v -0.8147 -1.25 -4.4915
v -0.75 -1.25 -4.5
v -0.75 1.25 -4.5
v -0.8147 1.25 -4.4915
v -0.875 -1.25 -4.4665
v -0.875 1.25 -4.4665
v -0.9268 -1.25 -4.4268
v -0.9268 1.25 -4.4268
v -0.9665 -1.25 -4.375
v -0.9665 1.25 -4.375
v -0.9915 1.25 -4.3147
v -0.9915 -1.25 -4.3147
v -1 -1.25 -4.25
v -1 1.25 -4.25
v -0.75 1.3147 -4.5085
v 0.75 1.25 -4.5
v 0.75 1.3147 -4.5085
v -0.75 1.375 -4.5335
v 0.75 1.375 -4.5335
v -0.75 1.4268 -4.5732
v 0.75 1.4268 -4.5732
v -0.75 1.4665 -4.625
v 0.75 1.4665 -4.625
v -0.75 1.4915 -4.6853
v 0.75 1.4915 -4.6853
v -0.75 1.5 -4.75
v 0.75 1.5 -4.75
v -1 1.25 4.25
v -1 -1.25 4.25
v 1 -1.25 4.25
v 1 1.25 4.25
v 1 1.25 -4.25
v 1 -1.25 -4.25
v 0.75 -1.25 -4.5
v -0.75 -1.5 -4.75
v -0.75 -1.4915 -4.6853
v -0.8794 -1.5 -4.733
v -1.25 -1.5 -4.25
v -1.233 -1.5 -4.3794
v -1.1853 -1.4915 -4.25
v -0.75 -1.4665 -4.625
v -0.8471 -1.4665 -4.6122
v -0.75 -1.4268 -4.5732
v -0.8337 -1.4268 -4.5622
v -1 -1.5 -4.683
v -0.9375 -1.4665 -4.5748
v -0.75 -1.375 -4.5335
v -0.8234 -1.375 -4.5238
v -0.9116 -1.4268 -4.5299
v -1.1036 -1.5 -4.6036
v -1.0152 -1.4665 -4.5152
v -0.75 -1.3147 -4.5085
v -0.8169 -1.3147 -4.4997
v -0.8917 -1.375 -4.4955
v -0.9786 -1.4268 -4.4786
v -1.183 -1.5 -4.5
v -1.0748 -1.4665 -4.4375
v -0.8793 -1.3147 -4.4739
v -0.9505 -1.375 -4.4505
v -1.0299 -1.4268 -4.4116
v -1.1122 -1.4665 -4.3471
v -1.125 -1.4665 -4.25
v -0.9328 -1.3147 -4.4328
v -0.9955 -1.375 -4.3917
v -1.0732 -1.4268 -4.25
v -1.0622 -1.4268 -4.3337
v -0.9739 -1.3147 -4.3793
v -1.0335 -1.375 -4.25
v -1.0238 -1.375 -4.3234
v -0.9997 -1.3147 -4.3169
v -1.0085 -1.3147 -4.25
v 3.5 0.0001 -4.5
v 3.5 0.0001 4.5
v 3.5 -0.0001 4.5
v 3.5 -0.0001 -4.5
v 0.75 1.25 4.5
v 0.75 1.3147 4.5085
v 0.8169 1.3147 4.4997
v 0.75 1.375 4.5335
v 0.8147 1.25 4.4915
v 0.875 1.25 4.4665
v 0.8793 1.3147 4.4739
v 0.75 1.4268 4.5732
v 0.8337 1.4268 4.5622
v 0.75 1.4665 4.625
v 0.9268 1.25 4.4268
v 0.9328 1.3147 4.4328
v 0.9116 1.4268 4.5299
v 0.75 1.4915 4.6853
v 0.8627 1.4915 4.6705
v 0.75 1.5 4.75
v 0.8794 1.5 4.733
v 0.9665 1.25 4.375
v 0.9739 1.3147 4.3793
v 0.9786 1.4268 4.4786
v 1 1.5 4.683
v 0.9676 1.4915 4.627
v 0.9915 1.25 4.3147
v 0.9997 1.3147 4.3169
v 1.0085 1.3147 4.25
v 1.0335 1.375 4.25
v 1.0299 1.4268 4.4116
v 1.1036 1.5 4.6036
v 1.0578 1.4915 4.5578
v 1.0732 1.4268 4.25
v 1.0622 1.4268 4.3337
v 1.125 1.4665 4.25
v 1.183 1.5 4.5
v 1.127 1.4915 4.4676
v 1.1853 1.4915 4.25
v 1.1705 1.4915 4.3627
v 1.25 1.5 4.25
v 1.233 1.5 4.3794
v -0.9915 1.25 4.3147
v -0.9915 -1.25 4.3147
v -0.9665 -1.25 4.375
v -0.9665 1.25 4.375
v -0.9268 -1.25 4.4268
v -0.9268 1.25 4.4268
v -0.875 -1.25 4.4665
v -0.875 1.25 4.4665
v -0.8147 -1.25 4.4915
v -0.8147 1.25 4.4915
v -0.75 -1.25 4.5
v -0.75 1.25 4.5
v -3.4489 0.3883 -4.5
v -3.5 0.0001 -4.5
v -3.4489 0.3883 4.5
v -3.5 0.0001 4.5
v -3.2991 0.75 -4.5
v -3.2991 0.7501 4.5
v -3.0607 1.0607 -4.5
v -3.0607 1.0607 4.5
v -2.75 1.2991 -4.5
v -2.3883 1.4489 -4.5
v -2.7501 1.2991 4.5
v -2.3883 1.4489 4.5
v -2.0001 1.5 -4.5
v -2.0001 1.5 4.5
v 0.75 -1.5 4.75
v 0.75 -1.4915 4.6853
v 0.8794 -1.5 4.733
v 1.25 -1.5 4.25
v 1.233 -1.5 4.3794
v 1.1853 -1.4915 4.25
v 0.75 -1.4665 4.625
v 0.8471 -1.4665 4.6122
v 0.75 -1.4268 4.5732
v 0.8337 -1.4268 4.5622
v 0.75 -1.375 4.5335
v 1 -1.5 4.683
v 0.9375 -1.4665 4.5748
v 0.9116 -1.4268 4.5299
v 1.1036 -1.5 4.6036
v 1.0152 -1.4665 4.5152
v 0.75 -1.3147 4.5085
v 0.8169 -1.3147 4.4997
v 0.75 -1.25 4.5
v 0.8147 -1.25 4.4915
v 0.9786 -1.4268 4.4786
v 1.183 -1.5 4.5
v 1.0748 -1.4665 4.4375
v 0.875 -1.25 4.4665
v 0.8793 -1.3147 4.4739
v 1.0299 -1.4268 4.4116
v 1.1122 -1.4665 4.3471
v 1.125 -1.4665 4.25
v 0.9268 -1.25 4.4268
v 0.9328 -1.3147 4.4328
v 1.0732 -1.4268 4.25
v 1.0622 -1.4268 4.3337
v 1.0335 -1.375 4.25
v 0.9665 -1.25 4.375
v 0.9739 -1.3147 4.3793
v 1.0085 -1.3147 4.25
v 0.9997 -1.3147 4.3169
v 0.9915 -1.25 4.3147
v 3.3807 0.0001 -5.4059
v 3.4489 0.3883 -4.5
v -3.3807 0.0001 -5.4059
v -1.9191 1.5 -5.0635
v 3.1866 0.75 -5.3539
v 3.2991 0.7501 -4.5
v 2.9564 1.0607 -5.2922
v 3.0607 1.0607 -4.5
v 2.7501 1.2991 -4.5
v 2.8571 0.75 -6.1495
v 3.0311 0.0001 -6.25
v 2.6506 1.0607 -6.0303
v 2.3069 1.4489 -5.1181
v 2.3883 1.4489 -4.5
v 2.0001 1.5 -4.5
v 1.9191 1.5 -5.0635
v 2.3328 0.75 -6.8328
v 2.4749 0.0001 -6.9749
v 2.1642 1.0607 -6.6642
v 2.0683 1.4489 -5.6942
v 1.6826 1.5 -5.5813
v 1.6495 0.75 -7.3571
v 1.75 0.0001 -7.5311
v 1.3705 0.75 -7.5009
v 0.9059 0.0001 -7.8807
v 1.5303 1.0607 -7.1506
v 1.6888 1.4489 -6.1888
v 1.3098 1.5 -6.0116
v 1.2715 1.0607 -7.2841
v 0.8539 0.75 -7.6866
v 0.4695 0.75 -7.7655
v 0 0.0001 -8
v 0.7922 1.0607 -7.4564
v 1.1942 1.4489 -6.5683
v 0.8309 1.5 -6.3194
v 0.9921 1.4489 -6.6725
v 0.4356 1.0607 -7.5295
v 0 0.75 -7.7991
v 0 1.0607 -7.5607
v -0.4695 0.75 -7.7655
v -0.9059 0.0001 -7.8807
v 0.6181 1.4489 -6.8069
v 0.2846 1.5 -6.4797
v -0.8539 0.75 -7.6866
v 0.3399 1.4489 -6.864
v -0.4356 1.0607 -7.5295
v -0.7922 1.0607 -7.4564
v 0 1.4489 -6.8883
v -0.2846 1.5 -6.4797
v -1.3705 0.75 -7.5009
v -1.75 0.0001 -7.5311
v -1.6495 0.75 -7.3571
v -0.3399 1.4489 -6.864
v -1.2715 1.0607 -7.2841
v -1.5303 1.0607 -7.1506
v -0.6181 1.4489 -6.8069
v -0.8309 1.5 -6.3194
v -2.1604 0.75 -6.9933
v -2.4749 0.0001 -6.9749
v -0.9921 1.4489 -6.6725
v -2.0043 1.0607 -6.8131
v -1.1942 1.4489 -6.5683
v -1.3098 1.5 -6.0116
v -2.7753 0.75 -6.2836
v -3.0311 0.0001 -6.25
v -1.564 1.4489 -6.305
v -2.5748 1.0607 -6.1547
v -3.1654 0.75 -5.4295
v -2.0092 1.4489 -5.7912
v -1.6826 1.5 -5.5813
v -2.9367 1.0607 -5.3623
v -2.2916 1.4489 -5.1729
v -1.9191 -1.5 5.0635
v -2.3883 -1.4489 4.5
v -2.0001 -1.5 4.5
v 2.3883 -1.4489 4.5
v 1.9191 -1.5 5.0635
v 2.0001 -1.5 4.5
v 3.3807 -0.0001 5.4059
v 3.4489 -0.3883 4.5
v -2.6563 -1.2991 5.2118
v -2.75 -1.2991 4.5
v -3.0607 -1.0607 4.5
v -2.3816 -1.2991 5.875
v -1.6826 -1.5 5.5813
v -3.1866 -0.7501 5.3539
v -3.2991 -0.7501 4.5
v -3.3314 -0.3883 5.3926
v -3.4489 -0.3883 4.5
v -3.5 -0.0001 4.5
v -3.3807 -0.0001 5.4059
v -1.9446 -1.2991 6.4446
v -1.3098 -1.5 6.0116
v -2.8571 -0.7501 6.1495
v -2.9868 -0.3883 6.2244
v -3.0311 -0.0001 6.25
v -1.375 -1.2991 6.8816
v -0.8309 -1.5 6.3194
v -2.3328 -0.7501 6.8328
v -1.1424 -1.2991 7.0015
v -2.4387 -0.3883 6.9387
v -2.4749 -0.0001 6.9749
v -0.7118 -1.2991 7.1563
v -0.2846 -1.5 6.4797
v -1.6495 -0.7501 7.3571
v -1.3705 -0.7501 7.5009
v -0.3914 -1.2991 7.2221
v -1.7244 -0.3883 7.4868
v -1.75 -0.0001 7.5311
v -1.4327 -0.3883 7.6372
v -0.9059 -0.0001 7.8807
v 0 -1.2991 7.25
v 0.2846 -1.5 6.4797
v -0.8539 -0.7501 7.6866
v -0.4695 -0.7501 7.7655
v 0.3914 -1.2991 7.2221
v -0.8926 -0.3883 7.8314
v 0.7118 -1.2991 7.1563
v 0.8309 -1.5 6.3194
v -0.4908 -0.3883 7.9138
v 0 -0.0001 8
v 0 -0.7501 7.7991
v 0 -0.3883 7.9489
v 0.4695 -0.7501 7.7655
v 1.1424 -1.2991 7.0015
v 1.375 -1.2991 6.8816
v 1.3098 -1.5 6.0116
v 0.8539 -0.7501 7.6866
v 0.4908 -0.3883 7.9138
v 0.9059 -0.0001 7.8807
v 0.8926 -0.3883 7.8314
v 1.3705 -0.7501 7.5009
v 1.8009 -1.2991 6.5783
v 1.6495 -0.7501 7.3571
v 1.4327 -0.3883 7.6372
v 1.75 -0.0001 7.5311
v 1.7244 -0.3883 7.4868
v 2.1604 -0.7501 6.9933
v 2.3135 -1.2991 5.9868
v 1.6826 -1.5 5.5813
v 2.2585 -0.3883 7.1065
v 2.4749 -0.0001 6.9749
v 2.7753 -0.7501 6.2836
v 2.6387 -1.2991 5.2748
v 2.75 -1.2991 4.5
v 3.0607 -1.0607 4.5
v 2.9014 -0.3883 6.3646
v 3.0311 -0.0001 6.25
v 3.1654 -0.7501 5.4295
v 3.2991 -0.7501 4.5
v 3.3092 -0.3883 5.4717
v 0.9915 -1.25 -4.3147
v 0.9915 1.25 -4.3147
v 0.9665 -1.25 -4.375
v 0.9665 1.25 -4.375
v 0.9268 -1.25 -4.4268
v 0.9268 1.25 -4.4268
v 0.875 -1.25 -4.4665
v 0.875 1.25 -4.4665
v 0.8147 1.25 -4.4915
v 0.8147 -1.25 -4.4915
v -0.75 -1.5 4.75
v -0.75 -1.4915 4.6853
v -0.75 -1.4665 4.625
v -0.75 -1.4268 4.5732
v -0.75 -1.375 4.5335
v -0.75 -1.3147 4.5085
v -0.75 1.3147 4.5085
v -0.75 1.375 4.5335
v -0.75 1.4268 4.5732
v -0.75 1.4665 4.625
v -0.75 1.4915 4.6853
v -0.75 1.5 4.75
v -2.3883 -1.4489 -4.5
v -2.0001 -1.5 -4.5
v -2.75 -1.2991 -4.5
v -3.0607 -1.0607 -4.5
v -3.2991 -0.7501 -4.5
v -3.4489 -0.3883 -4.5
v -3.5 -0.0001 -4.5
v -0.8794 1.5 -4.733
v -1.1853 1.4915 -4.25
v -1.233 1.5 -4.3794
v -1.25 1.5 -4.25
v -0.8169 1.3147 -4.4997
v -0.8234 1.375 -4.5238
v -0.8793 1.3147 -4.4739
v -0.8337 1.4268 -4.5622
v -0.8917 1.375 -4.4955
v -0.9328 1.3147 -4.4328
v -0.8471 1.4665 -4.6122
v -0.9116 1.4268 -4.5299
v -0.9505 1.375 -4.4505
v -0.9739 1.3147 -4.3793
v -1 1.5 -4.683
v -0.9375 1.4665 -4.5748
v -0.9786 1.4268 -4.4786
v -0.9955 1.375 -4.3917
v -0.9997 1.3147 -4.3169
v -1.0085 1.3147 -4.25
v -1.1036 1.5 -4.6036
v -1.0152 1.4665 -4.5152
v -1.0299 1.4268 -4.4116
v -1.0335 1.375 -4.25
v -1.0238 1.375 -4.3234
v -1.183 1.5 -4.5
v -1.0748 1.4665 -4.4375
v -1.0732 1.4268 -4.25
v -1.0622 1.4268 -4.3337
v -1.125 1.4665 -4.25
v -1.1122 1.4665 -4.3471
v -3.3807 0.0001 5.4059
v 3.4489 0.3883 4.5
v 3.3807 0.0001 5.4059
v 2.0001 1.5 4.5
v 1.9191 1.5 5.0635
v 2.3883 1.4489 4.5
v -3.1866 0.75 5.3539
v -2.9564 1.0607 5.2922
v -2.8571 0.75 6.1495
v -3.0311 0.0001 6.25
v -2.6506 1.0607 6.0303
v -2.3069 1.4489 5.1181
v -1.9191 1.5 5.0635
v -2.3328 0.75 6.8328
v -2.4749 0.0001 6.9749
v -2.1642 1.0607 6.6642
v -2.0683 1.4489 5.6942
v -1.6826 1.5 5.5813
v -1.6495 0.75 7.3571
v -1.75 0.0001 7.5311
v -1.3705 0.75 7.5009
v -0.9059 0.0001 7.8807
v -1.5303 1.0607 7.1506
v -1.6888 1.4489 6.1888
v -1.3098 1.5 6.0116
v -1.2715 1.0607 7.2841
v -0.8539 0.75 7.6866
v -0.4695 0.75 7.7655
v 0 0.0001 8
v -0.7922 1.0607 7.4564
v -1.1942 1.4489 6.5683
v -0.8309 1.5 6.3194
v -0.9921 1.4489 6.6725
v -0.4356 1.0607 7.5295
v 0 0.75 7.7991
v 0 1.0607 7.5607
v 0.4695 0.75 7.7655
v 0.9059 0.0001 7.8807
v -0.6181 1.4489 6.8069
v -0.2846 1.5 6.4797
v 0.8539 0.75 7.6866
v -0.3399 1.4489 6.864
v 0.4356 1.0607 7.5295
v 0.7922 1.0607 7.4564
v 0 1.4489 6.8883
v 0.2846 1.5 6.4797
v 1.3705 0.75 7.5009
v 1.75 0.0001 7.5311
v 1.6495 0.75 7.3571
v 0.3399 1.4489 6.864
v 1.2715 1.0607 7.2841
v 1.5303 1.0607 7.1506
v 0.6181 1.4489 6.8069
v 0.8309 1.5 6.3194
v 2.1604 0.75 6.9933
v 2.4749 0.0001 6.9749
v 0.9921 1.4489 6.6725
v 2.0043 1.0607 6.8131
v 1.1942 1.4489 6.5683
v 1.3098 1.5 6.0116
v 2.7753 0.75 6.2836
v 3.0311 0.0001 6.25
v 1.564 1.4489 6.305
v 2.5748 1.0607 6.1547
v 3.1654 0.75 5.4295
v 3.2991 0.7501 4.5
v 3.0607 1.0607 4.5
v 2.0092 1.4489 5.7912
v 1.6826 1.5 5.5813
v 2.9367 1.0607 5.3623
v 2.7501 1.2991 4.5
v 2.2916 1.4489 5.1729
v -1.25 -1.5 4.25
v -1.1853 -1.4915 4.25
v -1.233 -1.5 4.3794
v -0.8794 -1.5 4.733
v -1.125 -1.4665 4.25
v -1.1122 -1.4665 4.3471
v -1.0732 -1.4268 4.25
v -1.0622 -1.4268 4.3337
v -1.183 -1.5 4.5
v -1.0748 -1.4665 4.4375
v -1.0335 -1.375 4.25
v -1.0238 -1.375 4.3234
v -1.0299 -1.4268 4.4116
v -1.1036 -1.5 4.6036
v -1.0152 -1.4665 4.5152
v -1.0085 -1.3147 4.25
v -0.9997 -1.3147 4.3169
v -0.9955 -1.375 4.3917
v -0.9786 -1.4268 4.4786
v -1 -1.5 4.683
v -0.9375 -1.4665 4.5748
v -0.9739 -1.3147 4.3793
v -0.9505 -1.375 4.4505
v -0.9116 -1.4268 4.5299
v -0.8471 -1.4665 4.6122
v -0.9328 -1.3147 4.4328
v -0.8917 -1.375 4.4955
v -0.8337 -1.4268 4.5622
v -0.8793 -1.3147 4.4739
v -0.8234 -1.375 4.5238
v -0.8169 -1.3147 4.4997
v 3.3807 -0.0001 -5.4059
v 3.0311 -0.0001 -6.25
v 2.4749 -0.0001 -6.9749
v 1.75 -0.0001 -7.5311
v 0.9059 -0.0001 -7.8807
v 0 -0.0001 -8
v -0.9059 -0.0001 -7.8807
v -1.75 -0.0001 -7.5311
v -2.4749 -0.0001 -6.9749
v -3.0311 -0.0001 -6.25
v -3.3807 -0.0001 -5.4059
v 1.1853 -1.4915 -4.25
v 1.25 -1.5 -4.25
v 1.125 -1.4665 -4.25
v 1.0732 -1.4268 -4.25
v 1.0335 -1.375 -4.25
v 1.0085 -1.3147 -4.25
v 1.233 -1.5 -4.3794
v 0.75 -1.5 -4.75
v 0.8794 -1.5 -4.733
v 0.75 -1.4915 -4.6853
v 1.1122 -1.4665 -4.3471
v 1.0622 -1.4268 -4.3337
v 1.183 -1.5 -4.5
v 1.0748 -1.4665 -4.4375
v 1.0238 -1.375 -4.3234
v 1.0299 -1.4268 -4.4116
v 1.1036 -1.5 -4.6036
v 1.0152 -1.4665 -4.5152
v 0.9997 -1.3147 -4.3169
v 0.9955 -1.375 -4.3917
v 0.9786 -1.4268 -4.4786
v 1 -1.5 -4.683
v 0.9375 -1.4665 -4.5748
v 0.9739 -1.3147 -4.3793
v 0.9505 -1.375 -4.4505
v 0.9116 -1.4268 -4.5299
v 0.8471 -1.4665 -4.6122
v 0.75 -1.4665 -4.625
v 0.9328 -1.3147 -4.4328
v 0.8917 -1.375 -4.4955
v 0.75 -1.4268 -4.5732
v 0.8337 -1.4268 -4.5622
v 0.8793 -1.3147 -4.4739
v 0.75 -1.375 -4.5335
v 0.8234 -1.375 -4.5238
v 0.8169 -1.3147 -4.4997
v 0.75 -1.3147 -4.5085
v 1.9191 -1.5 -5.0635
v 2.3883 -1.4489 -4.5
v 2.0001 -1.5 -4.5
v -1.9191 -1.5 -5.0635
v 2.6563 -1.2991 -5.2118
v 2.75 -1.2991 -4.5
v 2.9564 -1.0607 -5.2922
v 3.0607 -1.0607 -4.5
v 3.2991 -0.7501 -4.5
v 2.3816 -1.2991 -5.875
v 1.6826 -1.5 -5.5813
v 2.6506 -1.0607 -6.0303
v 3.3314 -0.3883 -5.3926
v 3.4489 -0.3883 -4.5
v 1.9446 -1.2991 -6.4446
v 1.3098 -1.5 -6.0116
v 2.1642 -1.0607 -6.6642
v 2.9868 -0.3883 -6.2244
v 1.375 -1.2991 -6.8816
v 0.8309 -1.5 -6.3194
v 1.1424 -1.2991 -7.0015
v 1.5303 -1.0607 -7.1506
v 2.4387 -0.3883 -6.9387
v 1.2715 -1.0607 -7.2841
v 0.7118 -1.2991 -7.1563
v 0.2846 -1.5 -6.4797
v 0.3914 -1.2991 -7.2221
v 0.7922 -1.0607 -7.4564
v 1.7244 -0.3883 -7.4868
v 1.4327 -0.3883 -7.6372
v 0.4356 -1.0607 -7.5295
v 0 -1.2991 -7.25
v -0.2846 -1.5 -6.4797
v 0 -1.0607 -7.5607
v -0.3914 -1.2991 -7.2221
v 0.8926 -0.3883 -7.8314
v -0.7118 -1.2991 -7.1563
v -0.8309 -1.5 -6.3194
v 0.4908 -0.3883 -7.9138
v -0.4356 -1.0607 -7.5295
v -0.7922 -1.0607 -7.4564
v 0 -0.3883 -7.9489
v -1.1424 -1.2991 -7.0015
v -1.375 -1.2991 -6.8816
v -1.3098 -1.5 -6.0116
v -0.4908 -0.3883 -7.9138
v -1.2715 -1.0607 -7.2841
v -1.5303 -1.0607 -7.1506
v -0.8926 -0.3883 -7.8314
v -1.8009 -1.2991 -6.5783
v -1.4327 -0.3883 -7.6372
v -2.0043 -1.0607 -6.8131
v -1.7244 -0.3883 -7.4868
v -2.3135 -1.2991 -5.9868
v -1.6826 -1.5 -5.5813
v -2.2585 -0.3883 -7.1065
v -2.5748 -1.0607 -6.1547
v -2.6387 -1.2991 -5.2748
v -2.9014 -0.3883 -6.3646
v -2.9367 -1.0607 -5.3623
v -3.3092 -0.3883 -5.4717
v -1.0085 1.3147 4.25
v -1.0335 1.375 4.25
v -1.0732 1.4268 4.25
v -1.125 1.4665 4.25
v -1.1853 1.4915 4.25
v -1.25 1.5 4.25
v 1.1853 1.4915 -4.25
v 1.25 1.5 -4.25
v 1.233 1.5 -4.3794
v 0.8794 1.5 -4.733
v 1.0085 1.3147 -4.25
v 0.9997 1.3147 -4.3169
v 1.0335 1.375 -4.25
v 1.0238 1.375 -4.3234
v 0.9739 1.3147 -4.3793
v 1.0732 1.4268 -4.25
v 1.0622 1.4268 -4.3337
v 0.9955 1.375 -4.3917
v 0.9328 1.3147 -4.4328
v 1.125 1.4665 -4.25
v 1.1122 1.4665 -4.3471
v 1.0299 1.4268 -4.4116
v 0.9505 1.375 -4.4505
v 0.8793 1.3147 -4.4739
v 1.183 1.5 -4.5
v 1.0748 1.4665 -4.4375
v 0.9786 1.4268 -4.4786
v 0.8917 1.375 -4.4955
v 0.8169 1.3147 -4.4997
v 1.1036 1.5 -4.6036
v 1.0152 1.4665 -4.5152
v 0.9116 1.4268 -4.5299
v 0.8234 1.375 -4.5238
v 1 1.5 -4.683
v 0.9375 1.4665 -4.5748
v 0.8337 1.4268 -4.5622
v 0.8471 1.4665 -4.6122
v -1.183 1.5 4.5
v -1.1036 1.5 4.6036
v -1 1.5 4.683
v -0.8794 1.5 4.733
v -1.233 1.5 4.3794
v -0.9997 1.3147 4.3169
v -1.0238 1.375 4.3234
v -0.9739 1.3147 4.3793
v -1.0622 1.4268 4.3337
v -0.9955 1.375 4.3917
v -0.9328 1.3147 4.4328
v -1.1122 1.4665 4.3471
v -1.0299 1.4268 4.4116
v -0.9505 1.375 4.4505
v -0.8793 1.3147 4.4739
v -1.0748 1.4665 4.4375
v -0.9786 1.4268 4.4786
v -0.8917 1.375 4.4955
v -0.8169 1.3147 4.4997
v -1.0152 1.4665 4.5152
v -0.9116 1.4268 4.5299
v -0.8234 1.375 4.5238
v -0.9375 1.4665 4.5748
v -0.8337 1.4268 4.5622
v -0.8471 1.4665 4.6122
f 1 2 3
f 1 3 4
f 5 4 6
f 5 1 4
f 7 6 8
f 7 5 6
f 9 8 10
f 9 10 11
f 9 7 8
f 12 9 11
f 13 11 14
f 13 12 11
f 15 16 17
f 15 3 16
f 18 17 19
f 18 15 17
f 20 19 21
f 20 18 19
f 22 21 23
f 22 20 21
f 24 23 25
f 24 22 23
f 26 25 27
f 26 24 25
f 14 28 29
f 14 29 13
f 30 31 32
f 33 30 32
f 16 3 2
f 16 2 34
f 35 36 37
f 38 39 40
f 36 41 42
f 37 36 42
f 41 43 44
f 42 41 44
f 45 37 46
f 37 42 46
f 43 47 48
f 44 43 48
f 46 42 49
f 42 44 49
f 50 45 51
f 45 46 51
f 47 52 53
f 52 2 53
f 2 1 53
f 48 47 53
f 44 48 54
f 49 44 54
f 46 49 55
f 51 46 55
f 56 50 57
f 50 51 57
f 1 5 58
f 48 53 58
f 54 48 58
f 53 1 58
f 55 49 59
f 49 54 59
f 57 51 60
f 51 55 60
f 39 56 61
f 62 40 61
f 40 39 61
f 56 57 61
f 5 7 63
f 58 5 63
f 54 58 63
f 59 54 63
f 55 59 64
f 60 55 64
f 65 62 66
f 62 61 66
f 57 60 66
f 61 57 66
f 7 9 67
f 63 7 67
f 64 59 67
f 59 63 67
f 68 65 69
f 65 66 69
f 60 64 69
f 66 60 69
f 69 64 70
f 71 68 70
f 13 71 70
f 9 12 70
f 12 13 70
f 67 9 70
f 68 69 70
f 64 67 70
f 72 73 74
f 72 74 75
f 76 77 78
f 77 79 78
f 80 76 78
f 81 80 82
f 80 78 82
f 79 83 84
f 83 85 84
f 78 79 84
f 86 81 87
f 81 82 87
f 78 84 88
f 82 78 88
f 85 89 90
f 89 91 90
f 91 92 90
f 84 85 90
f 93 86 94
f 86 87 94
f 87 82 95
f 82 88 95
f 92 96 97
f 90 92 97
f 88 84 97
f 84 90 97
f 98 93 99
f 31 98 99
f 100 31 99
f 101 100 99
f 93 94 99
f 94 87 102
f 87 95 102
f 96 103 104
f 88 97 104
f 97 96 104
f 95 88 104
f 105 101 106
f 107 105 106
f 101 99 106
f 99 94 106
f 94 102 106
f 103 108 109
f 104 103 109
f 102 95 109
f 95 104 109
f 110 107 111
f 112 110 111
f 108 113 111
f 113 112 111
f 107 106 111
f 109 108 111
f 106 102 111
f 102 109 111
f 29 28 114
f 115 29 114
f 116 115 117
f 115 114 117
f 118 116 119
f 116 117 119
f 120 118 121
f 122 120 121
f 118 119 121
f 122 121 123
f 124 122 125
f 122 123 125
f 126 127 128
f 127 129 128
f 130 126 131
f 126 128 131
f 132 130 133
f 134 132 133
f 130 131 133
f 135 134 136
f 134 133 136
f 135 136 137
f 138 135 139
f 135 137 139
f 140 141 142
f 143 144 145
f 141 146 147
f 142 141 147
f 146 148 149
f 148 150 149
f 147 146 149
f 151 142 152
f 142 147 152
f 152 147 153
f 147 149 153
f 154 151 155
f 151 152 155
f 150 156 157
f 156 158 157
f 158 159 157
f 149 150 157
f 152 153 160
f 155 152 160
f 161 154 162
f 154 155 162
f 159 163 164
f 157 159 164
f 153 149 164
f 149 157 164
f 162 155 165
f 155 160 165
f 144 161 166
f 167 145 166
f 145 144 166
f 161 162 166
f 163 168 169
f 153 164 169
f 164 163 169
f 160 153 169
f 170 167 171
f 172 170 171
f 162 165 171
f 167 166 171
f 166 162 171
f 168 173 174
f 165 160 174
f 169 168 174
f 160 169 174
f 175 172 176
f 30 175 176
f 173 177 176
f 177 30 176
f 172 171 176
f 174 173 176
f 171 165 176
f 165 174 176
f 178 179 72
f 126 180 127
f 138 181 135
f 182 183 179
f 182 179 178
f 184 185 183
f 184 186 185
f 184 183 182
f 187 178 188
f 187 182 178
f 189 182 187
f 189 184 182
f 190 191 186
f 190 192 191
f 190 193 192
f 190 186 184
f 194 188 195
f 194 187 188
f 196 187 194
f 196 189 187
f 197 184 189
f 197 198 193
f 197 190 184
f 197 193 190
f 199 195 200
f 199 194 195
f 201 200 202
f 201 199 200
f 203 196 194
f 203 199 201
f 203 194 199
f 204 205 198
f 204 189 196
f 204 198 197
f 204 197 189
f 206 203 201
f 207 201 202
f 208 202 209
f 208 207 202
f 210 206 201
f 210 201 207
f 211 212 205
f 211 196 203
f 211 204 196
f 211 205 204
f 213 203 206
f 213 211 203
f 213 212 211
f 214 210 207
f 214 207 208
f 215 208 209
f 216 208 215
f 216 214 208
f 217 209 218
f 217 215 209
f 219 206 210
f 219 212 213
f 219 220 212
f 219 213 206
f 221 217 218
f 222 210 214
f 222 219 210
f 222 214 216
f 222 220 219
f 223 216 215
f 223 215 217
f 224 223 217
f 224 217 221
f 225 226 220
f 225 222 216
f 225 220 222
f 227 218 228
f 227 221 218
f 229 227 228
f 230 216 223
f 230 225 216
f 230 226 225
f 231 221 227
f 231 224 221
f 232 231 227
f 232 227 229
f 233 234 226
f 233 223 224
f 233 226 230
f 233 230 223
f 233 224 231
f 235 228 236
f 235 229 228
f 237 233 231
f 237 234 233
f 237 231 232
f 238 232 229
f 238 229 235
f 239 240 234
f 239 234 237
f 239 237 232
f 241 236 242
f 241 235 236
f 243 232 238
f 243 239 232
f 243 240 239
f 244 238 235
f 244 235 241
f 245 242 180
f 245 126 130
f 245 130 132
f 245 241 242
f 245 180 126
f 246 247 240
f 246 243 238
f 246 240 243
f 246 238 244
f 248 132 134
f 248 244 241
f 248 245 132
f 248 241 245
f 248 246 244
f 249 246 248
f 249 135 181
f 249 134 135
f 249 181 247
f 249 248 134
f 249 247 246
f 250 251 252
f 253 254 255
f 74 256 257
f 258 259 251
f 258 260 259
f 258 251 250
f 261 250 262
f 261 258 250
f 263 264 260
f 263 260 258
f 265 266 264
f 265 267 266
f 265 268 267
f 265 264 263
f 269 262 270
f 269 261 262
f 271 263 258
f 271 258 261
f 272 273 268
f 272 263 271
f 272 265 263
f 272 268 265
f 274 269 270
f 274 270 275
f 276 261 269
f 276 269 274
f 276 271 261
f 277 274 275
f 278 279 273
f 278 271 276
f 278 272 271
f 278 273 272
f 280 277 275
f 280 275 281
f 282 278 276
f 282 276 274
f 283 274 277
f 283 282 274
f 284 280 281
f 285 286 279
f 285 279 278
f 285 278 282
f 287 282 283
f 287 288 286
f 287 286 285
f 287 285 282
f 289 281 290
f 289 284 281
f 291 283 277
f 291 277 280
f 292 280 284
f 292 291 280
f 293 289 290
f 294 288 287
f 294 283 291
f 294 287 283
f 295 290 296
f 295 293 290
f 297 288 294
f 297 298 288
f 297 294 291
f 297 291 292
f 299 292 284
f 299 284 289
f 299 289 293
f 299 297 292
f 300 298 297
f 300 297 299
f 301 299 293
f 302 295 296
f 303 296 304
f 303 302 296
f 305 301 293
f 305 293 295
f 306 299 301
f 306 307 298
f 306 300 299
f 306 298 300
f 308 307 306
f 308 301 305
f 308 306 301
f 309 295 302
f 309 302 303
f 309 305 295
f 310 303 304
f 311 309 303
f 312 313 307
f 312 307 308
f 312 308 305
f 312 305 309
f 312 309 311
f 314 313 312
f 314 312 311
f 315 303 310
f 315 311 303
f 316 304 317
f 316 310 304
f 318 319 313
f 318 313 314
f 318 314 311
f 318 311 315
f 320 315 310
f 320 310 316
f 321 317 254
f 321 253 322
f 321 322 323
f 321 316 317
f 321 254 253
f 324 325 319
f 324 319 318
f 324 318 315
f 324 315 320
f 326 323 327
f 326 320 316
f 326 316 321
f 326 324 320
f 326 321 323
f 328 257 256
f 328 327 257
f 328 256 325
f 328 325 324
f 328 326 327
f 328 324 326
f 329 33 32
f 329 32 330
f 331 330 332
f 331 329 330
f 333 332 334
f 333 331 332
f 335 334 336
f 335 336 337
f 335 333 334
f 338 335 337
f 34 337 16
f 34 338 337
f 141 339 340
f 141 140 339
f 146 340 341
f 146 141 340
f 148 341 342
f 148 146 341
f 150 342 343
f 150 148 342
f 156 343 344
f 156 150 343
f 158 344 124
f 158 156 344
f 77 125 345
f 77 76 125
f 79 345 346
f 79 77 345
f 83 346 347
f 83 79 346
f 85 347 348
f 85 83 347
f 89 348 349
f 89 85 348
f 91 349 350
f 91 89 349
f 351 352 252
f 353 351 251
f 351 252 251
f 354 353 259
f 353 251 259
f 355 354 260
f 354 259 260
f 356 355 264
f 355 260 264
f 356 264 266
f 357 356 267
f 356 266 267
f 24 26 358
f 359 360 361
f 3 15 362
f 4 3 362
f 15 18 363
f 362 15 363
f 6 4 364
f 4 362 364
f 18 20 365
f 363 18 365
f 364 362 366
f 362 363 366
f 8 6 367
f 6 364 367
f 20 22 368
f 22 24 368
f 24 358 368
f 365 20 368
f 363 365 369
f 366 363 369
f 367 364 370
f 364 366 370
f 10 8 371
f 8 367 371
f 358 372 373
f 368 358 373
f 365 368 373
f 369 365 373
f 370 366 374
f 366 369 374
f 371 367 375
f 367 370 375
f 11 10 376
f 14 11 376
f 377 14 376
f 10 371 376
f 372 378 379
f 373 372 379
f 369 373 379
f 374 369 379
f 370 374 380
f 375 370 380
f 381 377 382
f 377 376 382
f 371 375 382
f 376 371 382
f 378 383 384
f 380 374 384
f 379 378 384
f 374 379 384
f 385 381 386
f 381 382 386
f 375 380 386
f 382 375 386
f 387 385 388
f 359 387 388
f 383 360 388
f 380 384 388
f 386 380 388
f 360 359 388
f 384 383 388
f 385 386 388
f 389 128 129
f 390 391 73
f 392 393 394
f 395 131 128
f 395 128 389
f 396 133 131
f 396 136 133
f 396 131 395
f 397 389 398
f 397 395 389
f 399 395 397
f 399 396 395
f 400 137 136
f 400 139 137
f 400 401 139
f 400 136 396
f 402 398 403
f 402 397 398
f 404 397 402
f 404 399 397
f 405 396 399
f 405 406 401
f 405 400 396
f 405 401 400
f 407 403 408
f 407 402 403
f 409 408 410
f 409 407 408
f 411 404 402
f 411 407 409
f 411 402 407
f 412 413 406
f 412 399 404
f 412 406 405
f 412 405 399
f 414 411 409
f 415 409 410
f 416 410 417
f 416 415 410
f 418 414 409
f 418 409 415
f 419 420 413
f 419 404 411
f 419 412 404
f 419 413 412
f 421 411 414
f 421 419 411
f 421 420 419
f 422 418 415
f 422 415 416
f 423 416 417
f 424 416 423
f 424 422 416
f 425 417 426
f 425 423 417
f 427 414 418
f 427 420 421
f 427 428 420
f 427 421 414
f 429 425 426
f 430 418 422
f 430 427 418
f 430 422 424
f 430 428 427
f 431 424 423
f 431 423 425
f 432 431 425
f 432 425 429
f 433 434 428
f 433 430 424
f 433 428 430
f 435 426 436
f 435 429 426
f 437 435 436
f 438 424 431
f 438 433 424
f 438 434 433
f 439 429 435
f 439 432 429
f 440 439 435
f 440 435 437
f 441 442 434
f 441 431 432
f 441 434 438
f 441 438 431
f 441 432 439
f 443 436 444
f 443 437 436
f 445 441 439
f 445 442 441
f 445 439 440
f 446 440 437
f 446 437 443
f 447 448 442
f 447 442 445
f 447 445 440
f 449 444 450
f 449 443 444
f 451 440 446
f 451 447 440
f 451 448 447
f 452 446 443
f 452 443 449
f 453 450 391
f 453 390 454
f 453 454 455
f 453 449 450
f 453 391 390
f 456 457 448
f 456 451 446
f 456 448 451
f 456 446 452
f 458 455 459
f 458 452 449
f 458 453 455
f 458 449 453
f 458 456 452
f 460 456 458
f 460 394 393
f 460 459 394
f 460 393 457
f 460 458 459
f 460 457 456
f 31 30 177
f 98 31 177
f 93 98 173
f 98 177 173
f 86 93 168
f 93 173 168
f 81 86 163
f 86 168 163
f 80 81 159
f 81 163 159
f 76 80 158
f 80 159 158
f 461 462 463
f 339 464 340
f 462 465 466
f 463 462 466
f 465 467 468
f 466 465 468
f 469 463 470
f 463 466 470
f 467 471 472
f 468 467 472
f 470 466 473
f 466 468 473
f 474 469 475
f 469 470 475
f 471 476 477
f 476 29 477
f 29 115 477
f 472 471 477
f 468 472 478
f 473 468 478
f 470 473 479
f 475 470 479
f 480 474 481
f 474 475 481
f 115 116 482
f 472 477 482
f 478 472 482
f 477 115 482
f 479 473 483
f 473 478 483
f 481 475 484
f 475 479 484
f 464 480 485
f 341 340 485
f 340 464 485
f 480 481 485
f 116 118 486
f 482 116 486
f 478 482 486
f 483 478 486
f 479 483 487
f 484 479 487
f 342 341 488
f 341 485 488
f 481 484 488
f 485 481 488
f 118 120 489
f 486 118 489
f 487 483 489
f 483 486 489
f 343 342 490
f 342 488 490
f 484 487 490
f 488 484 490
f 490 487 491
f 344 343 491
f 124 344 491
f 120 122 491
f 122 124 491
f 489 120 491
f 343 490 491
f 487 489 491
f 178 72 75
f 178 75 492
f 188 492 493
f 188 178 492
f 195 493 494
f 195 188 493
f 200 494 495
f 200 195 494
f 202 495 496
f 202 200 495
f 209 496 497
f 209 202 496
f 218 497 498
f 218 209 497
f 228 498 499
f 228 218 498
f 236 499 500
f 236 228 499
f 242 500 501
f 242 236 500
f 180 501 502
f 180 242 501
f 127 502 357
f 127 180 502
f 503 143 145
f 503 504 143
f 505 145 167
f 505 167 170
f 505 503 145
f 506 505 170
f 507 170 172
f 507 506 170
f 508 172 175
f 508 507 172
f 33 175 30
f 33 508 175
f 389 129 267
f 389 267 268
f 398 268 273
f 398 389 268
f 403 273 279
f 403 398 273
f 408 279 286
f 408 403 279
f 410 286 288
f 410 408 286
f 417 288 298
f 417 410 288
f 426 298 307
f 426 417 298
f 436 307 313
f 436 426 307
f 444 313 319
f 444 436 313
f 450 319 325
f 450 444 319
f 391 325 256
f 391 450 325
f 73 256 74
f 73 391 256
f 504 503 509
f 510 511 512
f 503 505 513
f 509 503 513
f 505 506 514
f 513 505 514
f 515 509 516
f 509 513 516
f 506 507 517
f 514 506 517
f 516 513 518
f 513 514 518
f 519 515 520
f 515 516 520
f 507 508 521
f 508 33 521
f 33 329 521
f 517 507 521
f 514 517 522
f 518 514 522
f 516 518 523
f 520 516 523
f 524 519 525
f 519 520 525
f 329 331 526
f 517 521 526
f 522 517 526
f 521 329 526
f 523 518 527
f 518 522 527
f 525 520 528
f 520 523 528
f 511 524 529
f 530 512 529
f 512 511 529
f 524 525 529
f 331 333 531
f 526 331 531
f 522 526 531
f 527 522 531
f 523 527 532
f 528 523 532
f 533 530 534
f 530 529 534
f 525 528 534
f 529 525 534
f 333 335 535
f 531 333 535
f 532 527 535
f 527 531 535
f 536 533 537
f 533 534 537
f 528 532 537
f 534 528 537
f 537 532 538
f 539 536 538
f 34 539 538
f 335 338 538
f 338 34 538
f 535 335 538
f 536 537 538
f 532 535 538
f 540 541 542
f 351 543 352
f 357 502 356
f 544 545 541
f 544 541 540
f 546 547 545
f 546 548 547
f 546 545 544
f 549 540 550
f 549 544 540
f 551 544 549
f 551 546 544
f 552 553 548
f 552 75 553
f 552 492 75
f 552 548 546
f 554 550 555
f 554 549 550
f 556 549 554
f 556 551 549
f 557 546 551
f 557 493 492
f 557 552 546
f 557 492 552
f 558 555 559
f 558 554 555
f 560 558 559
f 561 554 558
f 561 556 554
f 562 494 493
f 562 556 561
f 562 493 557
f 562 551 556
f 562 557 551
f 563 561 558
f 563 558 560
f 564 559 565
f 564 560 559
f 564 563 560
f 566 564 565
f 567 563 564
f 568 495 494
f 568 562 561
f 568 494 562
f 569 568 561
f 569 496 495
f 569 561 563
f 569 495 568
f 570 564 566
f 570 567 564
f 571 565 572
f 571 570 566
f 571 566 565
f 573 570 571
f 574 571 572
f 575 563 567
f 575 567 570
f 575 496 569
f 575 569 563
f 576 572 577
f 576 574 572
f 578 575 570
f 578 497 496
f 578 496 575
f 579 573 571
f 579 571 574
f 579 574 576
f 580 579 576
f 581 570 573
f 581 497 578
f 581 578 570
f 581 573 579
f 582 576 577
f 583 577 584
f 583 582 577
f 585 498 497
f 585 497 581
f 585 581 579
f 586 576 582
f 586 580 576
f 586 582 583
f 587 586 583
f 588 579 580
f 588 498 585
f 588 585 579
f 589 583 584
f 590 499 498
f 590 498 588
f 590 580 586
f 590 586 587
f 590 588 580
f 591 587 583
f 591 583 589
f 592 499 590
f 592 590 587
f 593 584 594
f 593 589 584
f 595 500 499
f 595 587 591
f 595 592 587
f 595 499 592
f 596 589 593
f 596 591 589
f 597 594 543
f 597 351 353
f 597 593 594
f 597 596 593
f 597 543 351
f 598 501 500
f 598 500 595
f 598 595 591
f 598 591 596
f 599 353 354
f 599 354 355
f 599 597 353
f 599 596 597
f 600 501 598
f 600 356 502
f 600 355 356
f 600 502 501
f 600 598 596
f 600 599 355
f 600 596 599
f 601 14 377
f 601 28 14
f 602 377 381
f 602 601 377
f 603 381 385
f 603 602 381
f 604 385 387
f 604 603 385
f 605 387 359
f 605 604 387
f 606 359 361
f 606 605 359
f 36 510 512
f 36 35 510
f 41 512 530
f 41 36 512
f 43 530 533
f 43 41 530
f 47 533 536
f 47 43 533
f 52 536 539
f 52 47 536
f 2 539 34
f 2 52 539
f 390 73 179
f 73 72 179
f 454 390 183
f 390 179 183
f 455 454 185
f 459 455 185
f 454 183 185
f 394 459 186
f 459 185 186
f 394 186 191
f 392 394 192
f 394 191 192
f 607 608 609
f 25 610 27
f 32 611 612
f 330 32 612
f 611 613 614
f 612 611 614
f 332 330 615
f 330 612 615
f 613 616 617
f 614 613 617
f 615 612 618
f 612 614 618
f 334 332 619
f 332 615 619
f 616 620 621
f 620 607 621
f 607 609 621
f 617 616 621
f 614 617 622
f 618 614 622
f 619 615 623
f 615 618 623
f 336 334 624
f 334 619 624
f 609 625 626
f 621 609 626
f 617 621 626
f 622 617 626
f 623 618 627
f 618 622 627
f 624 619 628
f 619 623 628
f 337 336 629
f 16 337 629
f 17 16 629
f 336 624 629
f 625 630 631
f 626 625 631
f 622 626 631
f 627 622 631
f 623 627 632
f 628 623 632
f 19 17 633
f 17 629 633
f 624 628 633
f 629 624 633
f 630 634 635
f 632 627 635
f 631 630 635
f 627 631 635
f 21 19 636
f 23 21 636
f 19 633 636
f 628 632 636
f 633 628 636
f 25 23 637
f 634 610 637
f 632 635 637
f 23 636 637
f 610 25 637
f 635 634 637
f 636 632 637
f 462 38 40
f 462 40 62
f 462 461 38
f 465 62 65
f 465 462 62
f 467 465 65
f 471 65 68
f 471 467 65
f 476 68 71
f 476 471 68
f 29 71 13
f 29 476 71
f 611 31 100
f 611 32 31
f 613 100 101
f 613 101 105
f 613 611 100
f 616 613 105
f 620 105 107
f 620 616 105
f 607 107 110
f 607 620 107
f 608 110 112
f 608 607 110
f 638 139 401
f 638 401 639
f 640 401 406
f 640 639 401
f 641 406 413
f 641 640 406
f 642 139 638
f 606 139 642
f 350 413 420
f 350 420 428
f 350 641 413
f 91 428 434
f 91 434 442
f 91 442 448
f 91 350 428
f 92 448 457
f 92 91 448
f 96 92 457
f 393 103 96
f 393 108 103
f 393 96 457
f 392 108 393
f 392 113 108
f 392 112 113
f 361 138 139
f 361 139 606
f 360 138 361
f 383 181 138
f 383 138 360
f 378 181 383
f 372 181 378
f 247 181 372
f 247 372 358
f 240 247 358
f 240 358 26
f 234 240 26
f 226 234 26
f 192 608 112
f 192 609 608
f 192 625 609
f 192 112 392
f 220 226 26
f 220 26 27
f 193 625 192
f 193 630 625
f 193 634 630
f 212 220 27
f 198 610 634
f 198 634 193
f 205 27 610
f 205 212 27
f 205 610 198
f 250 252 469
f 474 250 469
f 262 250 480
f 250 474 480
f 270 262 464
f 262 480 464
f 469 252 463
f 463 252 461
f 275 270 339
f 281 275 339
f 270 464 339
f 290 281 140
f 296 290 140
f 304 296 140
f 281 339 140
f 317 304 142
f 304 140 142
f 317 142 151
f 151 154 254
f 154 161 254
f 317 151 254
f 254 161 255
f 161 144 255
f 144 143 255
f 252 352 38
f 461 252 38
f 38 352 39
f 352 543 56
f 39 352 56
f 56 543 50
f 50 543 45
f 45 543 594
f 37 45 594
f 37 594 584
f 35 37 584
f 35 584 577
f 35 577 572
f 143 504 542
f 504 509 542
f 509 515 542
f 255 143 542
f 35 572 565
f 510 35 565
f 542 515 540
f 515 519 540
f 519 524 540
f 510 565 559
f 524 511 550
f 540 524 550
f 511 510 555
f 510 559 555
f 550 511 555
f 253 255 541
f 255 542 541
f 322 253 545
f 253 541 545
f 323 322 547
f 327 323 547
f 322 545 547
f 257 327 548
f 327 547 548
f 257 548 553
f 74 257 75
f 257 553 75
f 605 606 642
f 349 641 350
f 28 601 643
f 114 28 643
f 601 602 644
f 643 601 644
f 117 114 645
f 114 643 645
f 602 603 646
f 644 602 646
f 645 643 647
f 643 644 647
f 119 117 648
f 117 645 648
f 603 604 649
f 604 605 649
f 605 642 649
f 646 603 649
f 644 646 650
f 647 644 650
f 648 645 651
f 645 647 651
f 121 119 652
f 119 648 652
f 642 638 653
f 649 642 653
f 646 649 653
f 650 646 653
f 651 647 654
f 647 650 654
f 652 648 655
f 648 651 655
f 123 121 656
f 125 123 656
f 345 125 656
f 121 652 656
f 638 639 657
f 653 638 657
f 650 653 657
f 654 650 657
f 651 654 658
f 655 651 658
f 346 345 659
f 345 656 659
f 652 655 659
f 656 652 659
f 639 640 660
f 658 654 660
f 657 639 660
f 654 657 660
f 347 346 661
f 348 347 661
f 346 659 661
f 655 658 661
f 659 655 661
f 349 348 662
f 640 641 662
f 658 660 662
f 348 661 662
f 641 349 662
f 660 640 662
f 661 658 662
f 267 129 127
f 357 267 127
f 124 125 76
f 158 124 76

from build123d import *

# Parameters (mm, degrees)
SKETCH1_W      = 7
SKETCH1_H      = 16
SKETCH1_W_2    = 2
SKETCH1_H_2    = 9
EXTRUDE1_DEPTH = 1.5
FILLET1_RADIUS = 3.5
FILLET1_LENGTH = 3
FILLET5_RADIUS = 3.5
FILLET5_LENGTH = 3
FILLET3_R      = 0.25
FILLET4_R      = 0.25
FILLET6_R      = 1.5


with BuildPart() as part:
    # Sketch1 → Extrude1 (new, symmetric)
    with BuildSketch(Plane(origin=(0, 0, 0), x_dir=(1, 0, 0), z_dir=(0, 1, 0))):
        Rectangle(SKETCH1_W, SKETCH1_H)
        Rectangle(SKETCH1_W_2, SKETCH1_H_2, mode=Mode.SUBTRACT)
    extrude(amount=EXTRUDE1_DEPTH, both=True)

    # Fillet1: full round fillet: the end face becomes a half cylinder, R = half its width
    fillet1_face = Plane((0, 0, 8), x_dir=(0, 1, 0), z_dir=(0, 0, 1))  # on the end face: x along it, z out of the body
    fillet1_slab = fillet1_face.offset(-FILLET1_RADIUS / 2) * Box(FILLET1_LENGTH, 2 * FILLET1_RADIUS, FILLET1_RADIUS, mode=Mode.PRIVATE)  # the body's end, R deep
    fillet1_round = Plane((0, 0, 4.5), x_dir=(0, 0, 1), z_dir=(0, 1, 0)) * Cylinder(FILLET1_RADIUS, FILLET1_LENGTH, mode=Mode.PRIVATE)  # its axis R under the face
    add(fillet1_slab - fillet1_round, mode=Mode.SUBTRACT)

    # Fillet5: full round fillet: the end face becomes a half cylinder, R = half its width
    fillet5_face = Plane((0, 0, -8), x_dir=(0, 1, 0), z_dir=(0, 0, -1))  # on the end face: x along it, z out of the body
    fillet5_slab = fillet5_face.offset(-FILLET5_RADIUS / 2) * Box(FILLET5_LENGTH, 2 * FILLET5_RADIUS, FILLET5_RADIUS, mode=Mode.PRIVATE)  # the body's end, R deep
    fillet5_round = Plane((0, 0, -4.5), x_dir=(0, 0, -1), z_dir=(0, 1, 0)) * Cylinder(FILLET5_RADIUS, FILLET5_LENGTH, mode=Mode.PRIVATE)  # its axis R under the face
    add(fillet5_slab - fillet5_round, mode=Mode.SUBTRACT)

    # Fillet3
    fillet3_edges = [part.edges().sort_by_distance(p)[0] for p in [
        (-1, 0, -4.5),
        (-1, 0, 4.5),
        (1, 0, 4.5),
        (1, 0, -4.5),
    ]]
    fillet(fillet3_edges, radius=FILLET3_R)

    # Fillet4
    fillet4_edges = [part.edges().sort_by_distance(p)[0] for p in [
        (1, -1.5, 0),
        (1, 1.5, 0),
        (0, -1.5, -4.5),
        (0, 1.5, -4.5),
        (-1, -1.5, 0),
        (-1, 1.5, 0),
        (0, -1.5, 4.5),
        (0, 1.5, 4.5),
        (0.926776695, -1.5, -4.426776695),
        (0.926776695, 1.5, -4.426776695),
        (-0.926776695, -1.5, -4.426776695),
        (-0.926776695, 1.5, -4.426776695),
        (0.926776695, -1.5, 4.426776695),
        (0.926776695, 1.5, 4.426776695),
        (-0.926776695, -1.5, 4.426776695),
        (-0.926776695, 1.5, 4.426776695),
    ]]
    fillet(fillet4_edges, radius=FILLET4_R)

    # Fillet6
    fillet6_edges = [part.edges().sort_by_distance(p)[0] for p in [
        (3.5, -1.5, 0),
        (3.5, 1.5, 0),
        (0, 1.5, 8),
        (-3.5, -1.5, 0),
        (-3.5, 1.5, 0),
        (0, -1.5, -8),
    ]]
    fillet(fillet6_edges, radius=FILLET6_R - 0.0001)  # a hair under: the kernel refuses the full size


solid = part.part
